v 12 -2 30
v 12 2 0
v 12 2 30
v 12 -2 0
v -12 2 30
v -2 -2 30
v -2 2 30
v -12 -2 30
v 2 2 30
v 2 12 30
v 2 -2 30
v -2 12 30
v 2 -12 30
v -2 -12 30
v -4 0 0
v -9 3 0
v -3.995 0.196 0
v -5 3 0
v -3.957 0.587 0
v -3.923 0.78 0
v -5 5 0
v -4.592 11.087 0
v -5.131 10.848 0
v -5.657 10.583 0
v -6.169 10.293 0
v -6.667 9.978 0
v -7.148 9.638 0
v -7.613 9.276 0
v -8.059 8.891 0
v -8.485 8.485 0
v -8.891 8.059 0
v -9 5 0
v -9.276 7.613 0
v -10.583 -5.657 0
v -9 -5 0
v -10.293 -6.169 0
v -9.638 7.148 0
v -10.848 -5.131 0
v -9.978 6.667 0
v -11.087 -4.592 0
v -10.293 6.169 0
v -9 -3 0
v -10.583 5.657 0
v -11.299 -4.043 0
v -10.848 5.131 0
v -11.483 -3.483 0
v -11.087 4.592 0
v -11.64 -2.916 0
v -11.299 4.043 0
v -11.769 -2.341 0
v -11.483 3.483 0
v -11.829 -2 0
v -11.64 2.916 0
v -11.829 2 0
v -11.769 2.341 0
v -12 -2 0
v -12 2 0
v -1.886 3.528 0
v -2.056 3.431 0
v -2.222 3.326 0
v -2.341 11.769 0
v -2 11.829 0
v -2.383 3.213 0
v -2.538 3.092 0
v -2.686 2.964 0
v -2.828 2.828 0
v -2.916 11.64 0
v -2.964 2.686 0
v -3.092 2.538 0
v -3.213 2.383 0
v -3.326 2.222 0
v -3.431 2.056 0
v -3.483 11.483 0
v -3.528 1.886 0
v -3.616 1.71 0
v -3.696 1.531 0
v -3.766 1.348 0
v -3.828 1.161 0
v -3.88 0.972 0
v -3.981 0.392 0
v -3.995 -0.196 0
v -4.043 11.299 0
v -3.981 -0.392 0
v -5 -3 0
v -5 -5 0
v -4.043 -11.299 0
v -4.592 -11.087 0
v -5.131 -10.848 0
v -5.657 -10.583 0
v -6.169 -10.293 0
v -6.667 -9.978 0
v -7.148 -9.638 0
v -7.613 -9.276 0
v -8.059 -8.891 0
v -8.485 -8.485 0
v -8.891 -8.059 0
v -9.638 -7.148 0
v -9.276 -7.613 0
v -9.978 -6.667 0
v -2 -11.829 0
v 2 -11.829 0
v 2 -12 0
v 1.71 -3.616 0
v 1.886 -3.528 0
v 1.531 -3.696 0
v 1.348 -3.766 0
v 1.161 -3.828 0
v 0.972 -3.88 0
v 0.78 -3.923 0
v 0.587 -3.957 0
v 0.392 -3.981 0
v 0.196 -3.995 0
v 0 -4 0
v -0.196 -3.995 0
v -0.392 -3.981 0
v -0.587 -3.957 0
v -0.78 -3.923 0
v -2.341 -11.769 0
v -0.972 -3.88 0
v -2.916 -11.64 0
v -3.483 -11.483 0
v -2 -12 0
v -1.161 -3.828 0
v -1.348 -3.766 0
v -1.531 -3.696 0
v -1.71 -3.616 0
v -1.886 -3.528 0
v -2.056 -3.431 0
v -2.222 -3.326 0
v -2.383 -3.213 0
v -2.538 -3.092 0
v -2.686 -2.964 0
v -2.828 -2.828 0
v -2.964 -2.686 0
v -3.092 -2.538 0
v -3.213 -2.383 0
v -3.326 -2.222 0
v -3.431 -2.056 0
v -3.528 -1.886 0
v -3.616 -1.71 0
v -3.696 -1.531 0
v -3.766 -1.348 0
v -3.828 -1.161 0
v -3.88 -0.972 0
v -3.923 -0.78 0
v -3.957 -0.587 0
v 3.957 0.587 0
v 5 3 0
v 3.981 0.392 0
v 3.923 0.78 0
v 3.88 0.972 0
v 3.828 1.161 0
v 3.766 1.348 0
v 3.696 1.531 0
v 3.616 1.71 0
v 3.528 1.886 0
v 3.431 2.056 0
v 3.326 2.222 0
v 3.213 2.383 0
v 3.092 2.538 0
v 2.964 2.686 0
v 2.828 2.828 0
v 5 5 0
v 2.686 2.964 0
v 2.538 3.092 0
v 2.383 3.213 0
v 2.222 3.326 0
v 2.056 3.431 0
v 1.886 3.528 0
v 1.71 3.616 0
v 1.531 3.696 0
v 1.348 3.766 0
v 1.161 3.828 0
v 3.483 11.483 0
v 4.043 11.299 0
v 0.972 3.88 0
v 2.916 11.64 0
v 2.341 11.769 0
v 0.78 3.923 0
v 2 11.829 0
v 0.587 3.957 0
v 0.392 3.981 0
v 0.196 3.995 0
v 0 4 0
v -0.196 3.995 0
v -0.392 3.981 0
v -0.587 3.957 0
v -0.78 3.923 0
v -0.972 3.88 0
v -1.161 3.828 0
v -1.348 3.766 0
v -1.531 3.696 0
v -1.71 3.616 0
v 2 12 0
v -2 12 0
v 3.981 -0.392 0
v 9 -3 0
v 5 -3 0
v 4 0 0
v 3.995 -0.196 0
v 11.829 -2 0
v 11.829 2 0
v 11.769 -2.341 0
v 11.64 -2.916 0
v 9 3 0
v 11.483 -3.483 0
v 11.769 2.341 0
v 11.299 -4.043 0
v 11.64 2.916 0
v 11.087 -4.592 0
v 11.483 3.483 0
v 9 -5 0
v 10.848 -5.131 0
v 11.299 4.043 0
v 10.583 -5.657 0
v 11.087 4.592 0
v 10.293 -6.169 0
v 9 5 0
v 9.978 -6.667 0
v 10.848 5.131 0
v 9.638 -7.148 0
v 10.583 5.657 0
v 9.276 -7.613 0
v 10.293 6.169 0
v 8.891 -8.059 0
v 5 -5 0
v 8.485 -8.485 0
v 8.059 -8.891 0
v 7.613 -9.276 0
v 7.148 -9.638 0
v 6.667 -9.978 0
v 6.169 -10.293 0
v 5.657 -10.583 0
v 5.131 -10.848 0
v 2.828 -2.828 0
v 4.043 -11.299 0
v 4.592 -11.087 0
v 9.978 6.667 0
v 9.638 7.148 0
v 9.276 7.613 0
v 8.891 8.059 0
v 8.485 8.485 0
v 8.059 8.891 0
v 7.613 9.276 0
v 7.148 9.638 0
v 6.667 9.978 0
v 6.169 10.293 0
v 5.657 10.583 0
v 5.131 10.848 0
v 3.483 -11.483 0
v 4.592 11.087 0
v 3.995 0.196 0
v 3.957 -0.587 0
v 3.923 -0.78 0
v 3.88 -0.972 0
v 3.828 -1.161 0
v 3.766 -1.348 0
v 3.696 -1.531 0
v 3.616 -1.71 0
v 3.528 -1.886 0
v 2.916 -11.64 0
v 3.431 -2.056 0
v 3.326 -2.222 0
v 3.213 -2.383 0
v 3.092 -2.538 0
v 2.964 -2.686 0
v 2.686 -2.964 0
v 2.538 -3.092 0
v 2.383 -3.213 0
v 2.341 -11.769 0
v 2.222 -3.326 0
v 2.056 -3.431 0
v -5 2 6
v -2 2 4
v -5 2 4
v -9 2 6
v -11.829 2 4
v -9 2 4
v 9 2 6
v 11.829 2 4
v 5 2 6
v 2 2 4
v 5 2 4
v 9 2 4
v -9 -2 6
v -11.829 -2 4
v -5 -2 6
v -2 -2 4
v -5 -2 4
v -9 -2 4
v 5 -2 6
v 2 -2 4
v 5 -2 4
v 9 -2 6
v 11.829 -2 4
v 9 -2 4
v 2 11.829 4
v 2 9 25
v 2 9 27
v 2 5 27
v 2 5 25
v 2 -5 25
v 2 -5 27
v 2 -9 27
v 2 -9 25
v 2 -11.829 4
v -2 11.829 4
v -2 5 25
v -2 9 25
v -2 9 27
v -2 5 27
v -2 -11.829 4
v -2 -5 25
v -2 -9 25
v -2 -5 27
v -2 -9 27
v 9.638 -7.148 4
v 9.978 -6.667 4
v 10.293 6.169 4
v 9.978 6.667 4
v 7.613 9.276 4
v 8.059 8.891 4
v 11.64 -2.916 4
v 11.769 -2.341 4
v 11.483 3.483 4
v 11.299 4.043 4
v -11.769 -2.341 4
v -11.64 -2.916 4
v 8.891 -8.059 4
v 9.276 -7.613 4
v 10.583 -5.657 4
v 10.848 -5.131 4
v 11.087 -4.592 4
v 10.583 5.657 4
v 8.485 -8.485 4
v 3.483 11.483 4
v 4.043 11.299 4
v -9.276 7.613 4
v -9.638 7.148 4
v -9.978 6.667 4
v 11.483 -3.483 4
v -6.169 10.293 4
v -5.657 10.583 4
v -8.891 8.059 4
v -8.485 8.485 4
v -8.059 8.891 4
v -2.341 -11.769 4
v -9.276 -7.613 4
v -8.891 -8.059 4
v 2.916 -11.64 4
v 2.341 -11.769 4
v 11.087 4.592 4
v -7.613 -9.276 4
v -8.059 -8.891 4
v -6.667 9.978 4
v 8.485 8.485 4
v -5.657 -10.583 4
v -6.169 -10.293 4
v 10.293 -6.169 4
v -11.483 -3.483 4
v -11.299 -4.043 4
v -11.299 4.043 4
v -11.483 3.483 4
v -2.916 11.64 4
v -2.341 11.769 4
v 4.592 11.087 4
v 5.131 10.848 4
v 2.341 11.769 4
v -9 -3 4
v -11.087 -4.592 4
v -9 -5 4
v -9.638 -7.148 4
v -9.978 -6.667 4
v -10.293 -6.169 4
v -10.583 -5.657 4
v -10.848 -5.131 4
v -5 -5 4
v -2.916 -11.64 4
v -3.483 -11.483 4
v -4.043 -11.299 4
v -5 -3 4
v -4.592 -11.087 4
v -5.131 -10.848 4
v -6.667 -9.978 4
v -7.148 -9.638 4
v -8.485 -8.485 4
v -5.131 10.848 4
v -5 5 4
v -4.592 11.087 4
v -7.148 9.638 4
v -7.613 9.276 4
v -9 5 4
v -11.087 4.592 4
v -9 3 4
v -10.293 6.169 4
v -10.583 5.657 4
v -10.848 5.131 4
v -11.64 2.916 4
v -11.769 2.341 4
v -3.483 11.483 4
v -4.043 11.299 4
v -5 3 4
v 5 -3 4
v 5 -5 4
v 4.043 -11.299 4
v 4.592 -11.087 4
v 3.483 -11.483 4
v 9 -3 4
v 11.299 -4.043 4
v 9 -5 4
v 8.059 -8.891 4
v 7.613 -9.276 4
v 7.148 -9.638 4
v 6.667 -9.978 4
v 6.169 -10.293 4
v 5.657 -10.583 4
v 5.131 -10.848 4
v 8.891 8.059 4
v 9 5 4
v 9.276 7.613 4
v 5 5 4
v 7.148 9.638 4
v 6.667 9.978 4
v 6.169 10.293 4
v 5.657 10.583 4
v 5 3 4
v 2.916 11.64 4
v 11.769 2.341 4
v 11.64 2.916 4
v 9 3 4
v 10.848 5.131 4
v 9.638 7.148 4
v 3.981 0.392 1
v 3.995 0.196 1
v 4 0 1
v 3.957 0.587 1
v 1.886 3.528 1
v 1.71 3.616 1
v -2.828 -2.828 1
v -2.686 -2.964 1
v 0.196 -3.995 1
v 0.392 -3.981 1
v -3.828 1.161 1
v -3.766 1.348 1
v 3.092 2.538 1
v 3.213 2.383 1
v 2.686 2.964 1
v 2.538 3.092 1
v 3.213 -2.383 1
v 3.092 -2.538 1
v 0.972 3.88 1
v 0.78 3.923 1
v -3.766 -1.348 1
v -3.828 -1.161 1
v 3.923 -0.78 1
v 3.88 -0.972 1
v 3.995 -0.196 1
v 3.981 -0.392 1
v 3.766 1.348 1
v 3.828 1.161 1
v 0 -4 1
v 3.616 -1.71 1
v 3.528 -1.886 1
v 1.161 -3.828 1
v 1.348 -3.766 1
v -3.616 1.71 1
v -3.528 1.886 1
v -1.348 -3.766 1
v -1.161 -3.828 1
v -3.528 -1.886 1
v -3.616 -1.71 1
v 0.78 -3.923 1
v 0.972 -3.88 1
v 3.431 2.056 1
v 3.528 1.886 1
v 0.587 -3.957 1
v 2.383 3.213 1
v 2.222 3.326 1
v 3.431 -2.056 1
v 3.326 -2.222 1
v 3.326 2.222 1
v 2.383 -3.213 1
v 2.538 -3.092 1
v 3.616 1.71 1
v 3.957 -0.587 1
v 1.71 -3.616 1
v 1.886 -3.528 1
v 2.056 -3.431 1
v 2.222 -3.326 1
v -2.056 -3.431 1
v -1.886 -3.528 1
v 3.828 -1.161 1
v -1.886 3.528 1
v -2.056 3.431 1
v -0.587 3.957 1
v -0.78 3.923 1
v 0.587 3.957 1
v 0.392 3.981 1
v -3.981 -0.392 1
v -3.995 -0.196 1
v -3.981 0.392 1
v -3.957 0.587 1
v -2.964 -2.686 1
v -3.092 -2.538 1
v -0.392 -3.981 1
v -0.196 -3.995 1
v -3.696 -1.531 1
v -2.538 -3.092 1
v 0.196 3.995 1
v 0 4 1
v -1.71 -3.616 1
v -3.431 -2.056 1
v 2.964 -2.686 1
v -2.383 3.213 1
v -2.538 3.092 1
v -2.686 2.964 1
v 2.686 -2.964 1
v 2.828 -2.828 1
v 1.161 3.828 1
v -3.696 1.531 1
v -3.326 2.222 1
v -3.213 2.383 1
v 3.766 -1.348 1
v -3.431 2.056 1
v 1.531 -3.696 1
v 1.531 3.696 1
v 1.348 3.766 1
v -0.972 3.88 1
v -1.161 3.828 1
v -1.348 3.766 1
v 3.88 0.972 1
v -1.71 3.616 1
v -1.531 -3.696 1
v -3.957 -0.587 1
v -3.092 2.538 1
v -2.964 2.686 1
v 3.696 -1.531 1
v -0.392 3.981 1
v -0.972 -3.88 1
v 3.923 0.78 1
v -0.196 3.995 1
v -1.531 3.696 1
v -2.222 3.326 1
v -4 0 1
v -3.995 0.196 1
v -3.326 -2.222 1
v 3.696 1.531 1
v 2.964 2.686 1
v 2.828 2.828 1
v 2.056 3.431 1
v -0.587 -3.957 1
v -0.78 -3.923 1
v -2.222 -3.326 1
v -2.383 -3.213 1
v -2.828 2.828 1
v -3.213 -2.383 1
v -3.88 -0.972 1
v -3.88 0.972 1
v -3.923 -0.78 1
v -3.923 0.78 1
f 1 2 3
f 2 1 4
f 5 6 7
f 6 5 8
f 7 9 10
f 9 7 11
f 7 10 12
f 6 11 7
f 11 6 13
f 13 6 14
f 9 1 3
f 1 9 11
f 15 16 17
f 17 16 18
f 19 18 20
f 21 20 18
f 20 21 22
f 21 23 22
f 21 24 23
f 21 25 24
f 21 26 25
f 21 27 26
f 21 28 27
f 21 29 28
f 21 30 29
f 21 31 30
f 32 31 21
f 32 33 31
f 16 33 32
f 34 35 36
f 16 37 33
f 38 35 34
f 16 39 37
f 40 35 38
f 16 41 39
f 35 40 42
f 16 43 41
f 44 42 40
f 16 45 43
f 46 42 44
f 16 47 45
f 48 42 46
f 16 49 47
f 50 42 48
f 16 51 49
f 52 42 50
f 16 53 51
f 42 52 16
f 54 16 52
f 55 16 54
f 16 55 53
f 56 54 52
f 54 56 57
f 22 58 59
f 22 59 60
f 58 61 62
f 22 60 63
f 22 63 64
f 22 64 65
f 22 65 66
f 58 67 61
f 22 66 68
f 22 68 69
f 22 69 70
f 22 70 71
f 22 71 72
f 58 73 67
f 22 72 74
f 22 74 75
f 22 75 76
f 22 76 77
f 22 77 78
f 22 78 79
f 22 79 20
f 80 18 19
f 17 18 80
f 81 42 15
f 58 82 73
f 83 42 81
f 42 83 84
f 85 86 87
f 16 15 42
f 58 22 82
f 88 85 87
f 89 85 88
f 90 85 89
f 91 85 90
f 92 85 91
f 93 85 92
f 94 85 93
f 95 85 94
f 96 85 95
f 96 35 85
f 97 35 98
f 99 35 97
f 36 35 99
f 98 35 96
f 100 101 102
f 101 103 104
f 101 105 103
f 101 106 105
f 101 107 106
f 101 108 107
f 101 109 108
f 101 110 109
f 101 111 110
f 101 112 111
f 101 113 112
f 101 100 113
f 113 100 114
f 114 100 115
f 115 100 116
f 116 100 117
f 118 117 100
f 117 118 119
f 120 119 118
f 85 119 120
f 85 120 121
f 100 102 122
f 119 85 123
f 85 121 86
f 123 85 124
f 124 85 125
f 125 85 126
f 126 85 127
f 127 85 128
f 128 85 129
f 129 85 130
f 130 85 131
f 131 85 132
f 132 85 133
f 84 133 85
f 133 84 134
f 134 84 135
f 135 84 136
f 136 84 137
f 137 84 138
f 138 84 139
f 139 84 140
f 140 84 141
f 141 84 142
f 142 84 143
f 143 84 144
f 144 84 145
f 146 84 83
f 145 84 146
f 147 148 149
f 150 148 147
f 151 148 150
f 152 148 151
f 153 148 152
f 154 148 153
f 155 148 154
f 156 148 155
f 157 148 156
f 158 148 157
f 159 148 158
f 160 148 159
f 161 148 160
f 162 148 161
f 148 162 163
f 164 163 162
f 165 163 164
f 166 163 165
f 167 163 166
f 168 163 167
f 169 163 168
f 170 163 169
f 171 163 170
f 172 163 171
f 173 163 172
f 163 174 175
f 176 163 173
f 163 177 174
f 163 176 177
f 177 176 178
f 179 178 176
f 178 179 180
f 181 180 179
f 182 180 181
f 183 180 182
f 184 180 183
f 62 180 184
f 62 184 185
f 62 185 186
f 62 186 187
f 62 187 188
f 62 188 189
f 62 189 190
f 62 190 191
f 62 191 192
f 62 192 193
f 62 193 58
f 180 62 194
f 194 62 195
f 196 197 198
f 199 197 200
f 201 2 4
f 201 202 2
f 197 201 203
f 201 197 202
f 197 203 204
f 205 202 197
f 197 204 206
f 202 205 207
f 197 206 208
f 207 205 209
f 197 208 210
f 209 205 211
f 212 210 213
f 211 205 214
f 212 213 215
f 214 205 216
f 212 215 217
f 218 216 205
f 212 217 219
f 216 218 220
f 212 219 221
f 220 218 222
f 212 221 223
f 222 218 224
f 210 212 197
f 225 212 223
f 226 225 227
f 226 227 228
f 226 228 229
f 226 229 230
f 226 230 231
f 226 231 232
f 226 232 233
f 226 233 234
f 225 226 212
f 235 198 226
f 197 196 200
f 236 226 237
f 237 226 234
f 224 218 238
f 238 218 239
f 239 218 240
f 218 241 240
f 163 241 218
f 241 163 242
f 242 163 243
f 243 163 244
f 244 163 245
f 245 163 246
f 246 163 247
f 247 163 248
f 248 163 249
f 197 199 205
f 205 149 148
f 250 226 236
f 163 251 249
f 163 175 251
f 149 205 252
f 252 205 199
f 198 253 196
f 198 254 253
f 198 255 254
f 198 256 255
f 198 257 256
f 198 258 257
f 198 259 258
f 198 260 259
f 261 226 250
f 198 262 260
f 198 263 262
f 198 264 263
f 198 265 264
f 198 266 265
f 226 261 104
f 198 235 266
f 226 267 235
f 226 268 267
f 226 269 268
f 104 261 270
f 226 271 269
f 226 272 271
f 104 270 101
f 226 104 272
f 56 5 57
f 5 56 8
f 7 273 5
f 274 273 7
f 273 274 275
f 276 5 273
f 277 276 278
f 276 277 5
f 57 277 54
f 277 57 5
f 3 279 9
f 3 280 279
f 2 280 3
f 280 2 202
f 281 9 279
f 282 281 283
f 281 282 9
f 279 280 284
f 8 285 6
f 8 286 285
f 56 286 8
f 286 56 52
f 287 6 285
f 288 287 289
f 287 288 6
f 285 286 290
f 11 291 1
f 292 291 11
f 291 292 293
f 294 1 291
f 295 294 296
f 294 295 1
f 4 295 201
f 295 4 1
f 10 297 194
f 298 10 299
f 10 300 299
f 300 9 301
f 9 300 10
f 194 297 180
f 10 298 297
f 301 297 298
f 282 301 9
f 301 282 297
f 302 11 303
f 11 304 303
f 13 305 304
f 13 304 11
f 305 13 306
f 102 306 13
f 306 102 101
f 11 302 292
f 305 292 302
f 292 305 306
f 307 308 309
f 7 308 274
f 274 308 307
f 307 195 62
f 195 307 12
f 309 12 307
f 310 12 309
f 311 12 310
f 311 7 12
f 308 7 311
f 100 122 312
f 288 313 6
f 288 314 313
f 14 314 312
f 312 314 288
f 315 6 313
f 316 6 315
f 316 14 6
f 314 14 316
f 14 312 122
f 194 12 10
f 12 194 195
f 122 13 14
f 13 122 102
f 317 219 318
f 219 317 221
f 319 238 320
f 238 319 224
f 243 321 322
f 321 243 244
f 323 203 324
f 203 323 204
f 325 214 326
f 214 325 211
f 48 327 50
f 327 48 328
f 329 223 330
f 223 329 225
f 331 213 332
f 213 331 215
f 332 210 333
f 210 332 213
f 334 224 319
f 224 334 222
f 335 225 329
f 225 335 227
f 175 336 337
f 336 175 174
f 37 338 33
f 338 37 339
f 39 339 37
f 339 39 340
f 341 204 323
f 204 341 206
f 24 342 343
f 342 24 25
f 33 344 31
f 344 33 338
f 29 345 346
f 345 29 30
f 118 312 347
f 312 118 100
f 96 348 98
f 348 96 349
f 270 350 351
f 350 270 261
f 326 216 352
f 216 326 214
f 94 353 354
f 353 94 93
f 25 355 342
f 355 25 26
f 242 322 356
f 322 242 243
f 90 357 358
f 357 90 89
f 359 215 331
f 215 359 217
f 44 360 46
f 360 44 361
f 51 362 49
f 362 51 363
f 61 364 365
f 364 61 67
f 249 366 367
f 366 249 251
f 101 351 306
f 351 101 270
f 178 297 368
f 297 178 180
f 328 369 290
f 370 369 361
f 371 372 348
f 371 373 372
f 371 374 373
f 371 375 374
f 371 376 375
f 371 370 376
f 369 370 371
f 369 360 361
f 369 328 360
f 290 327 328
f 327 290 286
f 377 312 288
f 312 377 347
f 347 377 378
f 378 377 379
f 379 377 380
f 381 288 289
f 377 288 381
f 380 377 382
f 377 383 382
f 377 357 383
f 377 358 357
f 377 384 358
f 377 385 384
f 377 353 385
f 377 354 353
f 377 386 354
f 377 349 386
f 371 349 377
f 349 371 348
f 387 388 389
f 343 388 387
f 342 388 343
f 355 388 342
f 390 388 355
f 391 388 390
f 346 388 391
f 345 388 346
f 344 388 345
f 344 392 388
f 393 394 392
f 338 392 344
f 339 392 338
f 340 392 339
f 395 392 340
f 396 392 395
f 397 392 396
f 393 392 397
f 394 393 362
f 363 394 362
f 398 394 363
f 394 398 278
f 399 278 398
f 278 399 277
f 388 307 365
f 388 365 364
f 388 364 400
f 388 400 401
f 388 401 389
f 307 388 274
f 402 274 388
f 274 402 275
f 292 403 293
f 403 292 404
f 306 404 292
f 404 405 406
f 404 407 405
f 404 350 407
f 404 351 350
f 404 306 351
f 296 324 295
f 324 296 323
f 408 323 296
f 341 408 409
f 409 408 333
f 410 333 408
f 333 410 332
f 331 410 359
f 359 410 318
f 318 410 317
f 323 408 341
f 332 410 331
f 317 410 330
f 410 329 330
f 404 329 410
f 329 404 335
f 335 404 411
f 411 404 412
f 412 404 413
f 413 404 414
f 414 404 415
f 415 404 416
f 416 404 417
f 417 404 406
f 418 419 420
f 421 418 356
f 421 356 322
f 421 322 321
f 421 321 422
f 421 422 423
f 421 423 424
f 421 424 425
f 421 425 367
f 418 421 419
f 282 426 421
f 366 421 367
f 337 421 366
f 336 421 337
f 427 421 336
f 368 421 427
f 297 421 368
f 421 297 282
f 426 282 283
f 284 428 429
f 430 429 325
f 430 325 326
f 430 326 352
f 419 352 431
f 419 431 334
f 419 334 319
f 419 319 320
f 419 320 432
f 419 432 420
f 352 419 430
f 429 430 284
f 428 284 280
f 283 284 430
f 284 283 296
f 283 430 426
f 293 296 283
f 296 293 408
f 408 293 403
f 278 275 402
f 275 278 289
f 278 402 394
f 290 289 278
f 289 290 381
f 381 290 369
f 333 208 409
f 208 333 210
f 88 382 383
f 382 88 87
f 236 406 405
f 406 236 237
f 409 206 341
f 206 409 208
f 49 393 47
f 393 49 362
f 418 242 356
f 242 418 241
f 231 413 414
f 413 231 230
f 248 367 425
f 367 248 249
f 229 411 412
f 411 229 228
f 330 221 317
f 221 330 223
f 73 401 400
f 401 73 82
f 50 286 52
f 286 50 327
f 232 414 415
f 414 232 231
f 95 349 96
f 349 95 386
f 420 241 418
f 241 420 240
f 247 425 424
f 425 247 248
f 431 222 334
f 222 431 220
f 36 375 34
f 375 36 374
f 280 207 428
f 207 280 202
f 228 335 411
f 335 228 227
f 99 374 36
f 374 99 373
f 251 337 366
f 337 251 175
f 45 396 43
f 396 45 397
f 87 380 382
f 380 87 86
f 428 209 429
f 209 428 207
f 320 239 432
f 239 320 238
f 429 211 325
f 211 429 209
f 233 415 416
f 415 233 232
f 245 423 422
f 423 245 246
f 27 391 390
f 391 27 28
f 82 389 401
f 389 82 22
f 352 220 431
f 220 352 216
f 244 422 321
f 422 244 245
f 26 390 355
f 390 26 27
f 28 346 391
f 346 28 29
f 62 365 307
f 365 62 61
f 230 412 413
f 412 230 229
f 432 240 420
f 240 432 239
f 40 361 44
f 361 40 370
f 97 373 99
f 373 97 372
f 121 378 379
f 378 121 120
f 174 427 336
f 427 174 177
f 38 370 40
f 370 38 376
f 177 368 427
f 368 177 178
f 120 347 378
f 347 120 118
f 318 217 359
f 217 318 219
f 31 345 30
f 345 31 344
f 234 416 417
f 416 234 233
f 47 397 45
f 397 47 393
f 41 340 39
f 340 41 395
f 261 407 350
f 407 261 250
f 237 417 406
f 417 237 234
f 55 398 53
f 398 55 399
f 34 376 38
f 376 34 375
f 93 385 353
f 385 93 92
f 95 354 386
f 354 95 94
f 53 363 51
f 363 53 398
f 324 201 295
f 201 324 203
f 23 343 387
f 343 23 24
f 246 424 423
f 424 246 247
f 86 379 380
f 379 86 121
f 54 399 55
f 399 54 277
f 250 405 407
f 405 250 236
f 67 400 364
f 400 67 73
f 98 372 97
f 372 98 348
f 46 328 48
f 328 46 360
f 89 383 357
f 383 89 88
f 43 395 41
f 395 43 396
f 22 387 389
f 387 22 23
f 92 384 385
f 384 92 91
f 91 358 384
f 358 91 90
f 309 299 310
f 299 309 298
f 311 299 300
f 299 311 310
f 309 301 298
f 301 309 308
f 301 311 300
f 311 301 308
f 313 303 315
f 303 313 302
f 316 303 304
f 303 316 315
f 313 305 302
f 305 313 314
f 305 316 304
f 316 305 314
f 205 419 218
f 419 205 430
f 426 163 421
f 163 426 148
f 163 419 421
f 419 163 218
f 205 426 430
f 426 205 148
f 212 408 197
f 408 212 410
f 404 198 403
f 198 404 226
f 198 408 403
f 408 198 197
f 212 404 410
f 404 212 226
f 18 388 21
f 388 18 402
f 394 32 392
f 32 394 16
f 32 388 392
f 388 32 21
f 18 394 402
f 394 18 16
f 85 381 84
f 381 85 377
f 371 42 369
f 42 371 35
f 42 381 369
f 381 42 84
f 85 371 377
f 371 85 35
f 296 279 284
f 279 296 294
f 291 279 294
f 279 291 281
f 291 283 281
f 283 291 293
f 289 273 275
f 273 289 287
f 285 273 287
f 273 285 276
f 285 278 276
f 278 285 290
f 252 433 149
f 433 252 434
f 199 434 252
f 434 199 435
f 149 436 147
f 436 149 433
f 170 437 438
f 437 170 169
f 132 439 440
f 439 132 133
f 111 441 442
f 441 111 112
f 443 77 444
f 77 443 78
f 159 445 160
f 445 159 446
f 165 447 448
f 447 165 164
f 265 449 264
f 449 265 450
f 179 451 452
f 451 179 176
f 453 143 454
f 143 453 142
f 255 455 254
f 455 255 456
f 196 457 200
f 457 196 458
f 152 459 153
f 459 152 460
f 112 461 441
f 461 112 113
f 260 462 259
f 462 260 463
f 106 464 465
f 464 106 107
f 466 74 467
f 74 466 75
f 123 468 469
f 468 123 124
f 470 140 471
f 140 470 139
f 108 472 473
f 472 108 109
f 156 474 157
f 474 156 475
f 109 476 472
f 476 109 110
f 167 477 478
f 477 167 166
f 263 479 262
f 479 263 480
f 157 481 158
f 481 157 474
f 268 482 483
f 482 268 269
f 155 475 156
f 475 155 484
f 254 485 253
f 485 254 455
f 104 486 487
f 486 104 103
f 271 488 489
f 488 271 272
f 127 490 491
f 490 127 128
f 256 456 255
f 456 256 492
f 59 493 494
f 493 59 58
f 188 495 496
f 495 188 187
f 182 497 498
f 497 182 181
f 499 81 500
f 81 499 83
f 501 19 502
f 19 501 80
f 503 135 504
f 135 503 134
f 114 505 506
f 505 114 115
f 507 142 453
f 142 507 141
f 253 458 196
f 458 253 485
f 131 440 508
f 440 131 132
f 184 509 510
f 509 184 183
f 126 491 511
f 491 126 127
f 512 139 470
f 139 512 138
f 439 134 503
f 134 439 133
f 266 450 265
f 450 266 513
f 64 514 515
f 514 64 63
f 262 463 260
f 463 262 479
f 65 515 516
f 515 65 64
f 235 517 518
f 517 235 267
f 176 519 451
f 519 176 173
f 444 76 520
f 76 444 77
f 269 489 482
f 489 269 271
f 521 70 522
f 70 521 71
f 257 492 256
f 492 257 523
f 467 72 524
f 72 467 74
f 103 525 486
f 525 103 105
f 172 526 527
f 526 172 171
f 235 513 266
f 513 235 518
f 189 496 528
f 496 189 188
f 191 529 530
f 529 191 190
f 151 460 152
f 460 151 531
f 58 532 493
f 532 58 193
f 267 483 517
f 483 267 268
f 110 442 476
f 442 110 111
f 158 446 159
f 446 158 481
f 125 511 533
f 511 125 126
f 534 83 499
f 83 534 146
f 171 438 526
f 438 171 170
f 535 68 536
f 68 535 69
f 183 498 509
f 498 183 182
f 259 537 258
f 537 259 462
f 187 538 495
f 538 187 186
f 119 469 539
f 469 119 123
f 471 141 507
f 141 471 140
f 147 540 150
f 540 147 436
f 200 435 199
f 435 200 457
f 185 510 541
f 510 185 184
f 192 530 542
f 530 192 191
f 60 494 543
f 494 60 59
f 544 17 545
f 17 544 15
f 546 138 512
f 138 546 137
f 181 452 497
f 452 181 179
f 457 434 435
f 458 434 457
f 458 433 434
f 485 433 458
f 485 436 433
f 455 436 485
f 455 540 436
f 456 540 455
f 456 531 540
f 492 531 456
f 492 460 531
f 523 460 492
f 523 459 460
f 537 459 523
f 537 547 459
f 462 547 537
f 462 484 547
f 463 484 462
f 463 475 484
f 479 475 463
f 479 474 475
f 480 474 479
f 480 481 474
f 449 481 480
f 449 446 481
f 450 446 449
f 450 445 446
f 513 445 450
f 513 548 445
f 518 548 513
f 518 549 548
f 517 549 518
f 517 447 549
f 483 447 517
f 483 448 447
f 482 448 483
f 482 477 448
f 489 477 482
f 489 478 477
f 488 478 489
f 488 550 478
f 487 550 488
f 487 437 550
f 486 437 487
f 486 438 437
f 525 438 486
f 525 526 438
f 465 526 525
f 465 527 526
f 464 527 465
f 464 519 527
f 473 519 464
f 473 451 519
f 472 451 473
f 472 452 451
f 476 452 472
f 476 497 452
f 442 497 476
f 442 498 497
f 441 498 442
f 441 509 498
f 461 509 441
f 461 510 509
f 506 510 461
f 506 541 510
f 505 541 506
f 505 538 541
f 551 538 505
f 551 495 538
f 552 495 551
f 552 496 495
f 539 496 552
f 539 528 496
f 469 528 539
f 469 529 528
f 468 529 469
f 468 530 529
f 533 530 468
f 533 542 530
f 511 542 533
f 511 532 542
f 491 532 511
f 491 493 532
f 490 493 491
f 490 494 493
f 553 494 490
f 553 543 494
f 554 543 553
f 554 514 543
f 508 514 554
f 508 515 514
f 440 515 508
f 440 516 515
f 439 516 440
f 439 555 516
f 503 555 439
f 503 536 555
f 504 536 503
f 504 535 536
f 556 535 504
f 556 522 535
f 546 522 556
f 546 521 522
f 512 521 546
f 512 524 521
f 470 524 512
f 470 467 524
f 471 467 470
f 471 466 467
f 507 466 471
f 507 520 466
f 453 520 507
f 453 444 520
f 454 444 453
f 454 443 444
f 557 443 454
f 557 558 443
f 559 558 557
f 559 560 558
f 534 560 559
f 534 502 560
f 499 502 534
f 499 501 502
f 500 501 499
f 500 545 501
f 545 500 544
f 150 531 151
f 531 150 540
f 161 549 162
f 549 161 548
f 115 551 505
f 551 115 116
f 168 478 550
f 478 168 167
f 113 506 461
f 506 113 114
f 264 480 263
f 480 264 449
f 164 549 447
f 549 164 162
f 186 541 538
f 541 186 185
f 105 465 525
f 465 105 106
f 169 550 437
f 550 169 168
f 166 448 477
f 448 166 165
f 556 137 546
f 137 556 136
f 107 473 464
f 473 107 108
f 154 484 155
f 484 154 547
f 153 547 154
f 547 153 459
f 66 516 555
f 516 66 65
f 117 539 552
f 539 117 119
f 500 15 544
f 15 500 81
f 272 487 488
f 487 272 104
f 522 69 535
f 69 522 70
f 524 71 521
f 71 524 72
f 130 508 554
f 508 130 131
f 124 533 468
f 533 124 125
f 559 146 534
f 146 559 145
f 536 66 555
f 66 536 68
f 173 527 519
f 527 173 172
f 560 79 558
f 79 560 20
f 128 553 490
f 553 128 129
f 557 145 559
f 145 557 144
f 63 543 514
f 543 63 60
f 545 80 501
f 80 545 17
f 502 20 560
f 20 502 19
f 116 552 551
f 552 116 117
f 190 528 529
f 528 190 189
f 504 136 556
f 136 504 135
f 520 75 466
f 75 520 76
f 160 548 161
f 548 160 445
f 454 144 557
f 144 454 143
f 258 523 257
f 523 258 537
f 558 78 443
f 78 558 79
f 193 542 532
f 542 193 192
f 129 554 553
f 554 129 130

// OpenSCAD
$fn = 128;

h = 30;
w = 24;
t = 4;

difference()
{
    union()
    {
        translate([-12,-2,0])
            cube([w, t, h], center = false);

        translate([-2,-12,0]) /*H Clamp holes*/
            cube([t, w, h], center = false);

        translate([0, 0,0])
            cylinder(h = t, r = w/2, center = false);
    }

    /*V Clamp holes*/
    translate([5,3,-10])
        cube(size=[4,2,20]);

    translate([5,-3-2,-10])
        cube(size=[4,2,20]);

    translate([-9,3,-10])
        cube(size=[4,2,20]);

    translate([-9,-3-2,-10])
        cube(size=[4,2,20]);

    /*H Clamp holes*/
    translate([5,-3-2,4])
        cube([4,10,2], center=false);

    translate([-9,-3-2,4])
        cube([4,10,2], center=false);

    rotate(a=90, v=[0,0,1])
    {
        translate([5,-3-2,25])
            cube([4,10,2], center=false);

        translate([-9,-3-2,25])
            cube([4,10,2], center=false);
    }

    /*Horn hole*/
    translate([0,0,-2])
        cylinder(h=3, r1=4,r2=4,center=false);
}
